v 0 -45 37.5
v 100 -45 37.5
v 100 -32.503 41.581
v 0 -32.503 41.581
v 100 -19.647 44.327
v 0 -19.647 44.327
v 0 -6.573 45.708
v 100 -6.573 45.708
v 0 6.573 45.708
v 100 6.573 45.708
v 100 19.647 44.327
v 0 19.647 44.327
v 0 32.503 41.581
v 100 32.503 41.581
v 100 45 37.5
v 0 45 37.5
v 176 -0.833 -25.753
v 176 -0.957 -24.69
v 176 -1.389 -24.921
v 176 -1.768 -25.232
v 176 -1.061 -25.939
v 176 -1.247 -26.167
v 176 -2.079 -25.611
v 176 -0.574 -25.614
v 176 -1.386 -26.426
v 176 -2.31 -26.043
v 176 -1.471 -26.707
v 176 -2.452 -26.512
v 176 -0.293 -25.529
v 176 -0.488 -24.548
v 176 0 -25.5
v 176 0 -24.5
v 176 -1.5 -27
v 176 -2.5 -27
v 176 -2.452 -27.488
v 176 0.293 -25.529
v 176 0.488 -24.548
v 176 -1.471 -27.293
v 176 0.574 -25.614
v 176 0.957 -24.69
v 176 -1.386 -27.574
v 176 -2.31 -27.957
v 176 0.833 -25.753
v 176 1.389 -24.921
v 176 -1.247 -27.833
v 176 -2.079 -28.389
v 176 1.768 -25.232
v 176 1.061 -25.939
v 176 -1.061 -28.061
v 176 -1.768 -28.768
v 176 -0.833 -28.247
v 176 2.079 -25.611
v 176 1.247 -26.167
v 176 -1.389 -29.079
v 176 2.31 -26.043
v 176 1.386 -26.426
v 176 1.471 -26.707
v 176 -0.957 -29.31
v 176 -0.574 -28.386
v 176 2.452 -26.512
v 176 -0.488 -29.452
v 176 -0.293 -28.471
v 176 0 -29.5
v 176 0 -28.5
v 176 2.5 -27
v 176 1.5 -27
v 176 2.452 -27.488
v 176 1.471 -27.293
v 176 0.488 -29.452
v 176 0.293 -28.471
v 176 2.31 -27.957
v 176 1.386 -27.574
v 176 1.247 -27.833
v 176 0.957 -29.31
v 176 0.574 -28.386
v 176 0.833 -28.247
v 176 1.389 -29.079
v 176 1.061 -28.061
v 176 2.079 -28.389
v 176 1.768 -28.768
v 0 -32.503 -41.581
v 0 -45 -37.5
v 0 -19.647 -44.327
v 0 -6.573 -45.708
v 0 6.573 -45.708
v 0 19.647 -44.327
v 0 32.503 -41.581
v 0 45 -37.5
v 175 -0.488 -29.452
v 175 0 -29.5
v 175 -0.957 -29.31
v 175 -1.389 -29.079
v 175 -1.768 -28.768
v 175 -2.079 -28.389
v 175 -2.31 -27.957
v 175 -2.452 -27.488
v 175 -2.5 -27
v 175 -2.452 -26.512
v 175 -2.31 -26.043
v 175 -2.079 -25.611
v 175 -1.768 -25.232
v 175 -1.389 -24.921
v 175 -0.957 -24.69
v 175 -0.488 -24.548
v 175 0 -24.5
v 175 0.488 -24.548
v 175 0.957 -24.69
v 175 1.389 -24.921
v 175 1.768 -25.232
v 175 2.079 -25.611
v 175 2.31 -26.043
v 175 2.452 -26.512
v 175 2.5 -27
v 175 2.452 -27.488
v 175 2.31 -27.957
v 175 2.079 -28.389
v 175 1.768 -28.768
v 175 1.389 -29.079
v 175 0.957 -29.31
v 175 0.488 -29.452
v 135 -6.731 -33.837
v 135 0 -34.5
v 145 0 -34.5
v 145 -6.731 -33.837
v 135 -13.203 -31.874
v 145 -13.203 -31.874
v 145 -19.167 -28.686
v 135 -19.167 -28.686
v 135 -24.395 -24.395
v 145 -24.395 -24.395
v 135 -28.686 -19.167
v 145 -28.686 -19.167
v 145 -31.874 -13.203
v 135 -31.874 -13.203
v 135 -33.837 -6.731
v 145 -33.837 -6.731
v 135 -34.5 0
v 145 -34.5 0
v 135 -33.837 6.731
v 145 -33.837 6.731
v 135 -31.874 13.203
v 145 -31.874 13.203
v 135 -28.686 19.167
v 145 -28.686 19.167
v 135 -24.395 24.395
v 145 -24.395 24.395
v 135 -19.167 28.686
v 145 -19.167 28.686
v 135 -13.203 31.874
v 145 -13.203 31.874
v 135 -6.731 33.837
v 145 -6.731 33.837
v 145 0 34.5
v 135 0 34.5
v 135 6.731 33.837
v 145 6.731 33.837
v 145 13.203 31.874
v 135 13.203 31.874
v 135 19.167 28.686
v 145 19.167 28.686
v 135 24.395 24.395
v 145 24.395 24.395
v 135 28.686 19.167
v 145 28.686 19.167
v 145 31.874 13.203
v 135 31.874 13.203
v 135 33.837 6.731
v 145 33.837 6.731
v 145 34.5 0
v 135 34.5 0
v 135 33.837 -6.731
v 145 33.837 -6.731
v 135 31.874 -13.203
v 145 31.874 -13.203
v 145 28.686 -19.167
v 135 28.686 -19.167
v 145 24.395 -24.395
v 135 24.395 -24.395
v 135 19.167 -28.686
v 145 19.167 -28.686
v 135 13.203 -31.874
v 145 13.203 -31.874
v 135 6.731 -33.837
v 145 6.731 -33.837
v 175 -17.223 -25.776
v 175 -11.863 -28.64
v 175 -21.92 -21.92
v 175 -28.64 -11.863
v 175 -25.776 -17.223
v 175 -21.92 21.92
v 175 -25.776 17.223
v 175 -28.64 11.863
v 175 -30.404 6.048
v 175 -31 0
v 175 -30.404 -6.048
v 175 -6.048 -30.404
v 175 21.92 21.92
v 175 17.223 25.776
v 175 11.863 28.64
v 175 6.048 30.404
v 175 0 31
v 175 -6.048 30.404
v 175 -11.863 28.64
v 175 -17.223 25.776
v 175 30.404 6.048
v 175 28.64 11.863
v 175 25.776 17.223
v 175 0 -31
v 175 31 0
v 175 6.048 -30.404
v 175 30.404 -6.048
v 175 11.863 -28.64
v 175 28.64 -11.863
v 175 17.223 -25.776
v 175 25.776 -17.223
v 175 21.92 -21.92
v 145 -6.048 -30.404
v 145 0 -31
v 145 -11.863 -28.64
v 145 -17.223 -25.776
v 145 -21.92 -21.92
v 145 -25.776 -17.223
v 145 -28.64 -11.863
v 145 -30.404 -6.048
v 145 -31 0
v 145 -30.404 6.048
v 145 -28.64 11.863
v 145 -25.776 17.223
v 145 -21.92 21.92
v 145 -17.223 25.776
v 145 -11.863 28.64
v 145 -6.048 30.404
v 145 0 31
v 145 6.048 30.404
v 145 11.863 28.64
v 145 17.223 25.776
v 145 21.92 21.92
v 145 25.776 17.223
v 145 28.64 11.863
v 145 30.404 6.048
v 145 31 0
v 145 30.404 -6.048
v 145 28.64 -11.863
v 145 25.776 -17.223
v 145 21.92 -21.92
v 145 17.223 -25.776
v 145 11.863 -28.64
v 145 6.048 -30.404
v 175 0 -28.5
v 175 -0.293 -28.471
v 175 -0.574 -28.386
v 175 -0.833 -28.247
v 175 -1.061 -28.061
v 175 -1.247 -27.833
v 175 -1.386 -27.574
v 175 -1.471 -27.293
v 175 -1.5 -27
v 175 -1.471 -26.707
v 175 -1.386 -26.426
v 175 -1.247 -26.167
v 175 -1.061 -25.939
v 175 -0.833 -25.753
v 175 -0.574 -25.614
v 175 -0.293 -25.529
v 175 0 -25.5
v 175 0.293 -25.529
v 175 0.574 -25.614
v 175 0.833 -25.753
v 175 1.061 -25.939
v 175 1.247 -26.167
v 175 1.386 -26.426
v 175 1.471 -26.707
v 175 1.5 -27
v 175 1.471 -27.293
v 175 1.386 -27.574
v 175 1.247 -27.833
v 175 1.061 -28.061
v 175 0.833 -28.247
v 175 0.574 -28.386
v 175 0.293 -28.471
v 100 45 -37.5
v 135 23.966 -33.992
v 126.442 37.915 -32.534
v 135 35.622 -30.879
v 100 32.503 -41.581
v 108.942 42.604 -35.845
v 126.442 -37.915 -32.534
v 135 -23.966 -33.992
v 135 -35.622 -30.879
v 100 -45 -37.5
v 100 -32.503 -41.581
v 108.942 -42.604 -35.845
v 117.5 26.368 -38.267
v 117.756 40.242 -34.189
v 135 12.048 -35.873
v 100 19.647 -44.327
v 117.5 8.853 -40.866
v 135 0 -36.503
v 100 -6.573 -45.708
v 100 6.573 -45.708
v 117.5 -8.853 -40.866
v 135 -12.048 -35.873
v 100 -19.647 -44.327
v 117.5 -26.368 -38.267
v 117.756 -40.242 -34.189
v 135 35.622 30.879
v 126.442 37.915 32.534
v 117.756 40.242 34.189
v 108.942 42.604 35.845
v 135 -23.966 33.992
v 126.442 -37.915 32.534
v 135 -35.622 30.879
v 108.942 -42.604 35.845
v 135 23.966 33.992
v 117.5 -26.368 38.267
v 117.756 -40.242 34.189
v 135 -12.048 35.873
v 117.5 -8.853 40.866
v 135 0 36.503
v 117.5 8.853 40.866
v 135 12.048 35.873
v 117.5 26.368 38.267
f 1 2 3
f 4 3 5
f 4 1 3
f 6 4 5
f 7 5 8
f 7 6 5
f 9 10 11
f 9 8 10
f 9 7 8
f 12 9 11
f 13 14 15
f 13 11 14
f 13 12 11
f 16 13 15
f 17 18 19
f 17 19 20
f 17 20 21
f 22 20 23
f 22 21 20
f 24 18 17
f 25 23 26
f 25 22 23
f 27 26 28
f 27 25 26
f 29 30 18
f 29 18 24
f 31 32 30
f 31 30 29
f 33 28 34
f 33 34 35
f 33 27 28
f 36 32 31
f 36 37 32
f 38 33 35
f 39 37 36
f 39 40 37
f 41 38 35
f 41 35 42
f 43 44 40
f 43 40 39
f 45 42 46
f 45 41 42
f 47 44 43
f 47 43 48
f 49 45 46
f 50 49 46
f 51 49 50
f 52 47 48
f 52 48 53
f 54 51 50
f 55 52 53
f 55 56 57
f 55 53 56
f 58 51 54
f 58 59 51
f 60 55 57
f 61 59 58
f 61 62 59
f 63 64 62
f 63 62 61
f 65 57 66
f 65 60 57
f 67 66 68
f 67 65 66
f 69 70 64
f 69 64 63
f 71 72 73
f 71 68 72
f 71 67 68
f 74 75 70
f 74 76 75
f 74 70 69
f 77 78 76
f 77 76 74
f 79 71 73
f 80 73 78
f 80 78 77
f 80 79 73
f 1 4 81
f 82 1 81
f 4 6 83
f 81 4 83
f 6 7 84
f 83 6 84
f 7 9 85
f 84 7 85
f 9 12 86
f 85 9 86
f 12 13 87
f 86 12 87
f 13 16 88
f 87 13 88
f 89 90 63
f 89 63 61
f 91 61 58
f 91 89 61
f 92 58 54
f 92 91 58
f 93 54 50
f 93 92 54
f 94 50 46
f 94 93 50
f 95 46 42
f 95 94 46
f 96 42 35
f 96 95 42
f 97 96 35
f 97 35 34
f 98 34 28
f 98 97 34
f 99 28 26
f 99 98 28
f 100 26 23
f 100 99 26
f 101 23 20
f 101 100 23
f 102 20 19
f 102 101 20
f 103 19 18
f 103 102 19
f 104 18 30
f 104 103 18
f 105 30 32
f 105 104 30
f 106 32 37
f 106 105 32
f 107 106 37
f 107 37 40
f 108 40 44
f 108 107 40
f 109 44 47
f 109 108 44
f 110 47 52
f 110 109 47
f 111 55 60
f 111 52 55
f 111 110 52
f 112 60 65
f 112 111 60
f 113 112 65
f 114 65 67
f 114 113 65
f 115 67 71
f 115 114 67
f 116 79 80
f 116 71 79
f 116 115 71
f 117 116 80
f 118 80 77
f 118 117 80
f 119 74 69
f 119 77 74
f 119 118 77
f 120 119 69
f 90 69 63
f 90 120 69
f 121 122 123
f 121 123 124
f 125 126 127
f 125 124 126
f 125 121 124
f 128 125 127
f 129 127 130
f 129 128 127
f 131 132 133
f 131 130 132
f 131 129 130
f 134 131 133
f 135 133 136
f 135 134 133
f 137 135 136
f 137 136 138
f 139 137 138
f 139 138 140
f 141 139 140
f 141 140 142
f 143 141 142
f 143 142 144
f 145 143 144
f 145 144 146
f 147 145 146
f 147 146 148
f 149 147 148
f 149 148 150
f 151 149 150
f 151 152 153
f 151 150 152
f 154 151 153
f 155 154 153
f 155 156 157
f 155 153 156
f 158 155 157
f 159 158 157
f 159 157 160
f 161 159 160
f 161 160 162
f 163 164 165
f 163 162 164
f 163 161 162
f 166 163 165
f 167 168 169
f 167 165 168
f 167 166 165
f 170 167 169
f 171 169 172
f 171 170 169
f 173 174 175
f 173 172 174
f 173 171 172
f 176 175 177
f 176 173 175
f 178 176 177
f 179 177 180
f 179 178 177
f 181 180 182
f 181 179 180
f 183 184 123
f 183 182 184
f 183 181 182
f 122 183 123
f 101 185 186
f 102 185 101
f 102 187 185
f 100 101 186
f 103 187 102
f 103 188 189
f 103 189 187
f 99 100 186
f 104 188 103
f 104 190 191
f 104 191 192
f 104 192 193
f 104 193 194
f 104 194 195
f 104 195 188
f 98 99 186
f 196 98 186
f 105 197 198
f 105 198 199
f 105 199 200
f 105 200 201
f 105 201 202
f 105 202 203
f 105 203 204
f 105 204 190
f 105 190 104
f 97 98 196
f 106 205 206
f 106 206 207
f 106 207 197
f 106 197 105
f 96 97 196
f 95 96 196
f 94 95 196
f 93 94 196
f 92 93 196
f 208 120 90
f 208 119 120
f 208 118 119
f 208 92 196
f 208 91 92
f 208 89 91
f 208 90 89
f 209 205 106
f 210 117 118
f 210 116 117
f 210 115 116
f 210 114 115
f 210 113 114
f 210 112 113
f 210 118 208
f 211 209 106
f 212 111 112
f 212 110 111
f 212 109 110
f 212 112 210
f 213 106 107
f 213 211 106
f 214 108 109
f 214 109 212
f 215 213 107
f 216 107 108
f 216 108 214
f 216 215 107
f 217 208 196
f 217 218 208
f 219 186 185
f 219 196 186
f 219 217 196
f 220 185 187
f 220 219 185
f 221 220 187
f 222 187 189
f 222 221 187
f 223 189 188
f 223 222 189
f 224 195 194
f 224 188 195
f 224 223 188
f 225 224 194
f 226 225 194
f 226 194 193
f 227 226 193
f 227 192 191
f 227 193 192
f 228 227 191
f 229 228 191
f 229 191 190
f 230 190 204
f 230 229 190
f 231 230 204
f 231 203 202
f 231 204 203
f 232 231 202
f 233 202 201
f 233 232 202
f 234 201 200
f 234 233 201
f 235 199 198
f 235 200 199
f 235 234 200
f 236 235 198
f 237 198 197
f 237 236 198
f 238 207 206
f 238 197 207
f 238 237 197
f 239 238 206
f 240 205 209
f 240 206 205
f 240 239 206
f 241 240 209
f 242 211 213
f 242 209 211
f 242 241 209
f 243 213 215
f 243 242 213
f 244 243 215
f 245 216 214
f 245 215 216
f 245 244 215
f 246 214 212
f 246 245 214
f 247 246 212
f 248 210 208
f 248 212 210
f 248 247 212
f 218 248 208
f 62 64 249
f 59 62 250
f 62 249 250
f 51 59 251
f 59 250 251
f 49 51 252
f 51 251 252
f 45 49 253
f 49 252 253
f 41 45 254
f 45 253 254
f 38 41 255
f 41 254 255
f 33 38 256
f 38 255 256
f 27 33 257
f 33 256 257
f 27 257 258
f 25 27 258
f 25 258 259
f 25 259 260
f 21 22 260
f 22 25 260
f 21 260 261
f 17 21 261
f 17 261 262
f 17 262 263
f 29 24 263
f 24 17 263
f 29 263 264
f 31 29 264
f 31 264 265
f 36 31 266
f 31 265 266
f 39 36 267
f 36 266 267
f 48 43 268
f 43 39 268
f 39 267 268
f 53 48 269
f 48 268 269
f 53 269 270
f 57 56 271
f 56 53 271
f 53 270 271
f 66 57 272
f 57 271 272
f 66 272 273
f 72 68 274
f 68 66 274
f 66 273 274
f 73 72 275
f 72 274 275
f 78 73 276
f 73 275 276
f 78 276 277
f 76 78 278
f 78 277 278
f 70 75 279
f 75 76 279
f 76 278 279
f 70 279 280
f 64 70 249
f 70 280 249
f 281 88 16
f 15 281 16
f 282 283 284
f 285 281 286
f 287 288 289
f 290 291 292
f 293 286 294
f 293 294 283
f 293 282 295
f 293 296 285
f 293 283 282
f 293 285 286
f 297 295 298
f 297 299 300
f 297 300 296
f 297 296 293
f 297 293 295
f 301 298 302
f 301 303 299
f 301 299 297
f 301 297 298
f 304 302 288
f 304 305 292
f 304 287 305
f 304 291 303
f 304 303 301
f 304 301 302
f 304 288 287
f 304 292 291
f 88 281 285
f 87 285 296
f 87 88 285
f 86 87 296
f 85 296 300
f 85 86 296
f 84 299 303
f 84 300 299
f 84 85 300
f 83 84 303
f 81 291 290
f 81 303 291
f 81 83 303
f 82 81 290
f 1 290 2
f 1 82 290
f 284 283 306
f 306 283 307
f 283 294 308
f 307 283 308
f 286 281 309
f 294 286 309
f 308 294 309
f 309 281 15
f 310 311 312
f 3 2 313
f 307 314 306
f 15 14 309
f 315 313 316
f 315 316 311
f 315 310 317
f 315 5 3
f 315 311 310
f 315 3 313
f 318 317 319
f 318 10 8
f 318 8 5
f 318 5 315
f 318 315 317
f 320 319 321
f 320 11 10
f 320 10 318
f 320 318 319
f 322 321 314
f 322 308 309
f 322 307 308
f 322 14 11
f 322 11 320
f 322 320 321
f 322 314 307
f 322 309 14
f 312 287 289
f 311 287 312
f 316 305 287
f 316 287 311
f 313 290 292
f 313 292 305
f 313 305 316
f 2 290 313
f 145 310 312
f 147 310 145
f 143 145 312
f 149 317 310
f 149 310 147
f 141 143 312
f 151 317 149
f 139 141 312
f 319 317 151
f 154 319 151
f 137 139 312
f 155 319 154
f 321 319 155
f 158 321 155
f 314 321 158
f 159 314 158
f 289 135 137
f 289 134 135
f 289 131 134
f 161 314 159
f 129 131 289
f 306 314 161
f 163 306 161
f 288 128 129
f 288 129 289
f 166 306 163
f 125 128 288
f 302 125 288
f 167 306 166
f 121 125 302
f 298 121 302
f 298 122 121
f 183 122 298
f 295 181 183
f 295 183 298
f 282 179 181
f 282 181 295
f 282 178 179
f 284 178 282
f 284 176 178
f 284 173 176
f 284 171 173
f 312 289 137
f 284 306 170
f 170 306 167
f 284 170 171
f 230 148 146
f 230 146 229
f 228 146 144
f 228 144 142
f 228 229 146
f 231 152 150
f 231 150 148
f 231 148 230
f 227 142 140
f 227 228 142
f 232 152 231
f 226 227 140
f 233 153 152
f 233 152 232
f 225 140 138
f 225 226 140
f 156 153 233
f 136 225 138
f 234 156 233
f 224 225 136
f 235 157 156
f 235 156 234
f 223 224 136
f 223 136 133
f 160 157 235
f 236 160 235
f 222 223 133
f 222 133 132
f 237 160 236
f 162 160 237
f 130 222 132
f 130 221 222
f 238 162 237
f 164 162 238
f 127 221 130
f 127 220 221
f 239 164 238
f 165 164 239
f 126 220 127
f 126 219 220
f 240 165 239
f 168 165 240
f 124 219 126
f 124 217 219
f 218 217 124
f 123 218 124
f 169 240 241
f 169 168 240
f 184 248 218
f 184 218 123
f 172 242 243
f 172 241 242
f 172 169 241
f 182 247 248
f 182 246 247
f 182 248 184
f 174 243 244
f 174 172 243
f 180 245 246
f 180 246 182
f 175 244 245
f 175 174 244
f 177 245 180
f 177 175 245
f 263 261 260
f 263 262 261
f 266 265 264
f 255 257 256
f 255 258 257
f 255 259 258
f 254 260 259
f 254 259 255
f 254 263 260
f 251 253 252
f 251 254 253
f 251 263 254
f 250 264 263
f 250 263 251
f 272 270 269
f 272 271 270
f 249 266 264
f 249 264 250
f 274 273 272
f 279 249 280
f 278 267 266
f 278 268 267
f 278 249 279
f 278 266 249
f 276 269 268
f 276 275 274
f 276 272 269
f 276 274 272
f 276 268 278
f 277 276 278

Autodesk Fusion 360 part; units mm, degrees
sketch "Sketch1" plane through (0, 0, 0) normal (1, 0, 0) x (0, 0, -1)
  line L0 (0, 0) -> (0, 45)
  line L1 (0, 0) -> (0, -45)
  line L2 (0, 45) -> (37.5, 45)
  line L3 (0, 45) -> (-37.5, 45)
  line L4 (0, -45) -> (37.5, -45)
  line L5 (0, -45) -> (-37.5, -45)
  arc A0 (-37.5, 45) -> (-37.5, -45) centre (79.119, 0) ccw
  arc A1 (37.5, -45) -> (37.5, 45) centre (-79.119, 0) ccw
  dimension "d1" = 45
  dimension "d2" = 45
  dimension "d3" = 37.5
  dimension "d4" = 37.5
  dimension "d5" = 37.5
  dimension "d6" = 37.5
  dimension "d8" = 125
extrude "Extrude1" add sketch "Sketch1" along normal blind 100
extrude "Extrude2" add 1 faces at (100, -15.2642, -14.2806) along direction (1, 0, 0) blind 35 draft -15
sketch "Sketch2" plane through (135, 0, 0) normal (1, 0, 0) x (0, 0, -1)
  line L0 (-30.8786, -35.6218) -> (30.8786, -35.6218)
  arc A0 (30.8786, -35.6218) -> (30.8786, 35.6218) centre (-79.119, 0) ccw
  line L1 (30.8786, 35.6218) -> (-30.8786, 35.6218)
  arc A1 (-30.8786, 35.6218) -> (-30.8786, -35.6218) centre (79.119, 0) ccw
  circle A2 centre (0, 0) radius 34.5
  dimension "d13" = 69
extrude "Extrude3" add sketch "Sketch2" along normal blind 10 contours A2
sketch "Sketch3" plane through (145, 0, 0) normal (1, 0, 0) x (0, 0, -1)
  circle A0 centre (0, 0) radius 34.5
  circle A1 centre (0, 0) radius 31
  dimension "d16" = 62
extrude "Extrude4" add sketch "Sketch3" along normal blind 30 contours A1
sketch "Sketch4" plane through (175, 0, 0) normal (1, 0, 0) x (0, 0, -1)
  circle A0 centre (0, 0) radius 31
  line L0 (0, 0) -> (27, 0)
  circle A1 centre (27, 0) radius 2.5
  circle A2 centre (27, 0) radius 1.5
  dimension "d19" = 27
  dimension "d20" = 5
  dimension "d21" = -1
extrude "Extrude5" add sketch "Sketch4" along normal blind 1 contours A1
